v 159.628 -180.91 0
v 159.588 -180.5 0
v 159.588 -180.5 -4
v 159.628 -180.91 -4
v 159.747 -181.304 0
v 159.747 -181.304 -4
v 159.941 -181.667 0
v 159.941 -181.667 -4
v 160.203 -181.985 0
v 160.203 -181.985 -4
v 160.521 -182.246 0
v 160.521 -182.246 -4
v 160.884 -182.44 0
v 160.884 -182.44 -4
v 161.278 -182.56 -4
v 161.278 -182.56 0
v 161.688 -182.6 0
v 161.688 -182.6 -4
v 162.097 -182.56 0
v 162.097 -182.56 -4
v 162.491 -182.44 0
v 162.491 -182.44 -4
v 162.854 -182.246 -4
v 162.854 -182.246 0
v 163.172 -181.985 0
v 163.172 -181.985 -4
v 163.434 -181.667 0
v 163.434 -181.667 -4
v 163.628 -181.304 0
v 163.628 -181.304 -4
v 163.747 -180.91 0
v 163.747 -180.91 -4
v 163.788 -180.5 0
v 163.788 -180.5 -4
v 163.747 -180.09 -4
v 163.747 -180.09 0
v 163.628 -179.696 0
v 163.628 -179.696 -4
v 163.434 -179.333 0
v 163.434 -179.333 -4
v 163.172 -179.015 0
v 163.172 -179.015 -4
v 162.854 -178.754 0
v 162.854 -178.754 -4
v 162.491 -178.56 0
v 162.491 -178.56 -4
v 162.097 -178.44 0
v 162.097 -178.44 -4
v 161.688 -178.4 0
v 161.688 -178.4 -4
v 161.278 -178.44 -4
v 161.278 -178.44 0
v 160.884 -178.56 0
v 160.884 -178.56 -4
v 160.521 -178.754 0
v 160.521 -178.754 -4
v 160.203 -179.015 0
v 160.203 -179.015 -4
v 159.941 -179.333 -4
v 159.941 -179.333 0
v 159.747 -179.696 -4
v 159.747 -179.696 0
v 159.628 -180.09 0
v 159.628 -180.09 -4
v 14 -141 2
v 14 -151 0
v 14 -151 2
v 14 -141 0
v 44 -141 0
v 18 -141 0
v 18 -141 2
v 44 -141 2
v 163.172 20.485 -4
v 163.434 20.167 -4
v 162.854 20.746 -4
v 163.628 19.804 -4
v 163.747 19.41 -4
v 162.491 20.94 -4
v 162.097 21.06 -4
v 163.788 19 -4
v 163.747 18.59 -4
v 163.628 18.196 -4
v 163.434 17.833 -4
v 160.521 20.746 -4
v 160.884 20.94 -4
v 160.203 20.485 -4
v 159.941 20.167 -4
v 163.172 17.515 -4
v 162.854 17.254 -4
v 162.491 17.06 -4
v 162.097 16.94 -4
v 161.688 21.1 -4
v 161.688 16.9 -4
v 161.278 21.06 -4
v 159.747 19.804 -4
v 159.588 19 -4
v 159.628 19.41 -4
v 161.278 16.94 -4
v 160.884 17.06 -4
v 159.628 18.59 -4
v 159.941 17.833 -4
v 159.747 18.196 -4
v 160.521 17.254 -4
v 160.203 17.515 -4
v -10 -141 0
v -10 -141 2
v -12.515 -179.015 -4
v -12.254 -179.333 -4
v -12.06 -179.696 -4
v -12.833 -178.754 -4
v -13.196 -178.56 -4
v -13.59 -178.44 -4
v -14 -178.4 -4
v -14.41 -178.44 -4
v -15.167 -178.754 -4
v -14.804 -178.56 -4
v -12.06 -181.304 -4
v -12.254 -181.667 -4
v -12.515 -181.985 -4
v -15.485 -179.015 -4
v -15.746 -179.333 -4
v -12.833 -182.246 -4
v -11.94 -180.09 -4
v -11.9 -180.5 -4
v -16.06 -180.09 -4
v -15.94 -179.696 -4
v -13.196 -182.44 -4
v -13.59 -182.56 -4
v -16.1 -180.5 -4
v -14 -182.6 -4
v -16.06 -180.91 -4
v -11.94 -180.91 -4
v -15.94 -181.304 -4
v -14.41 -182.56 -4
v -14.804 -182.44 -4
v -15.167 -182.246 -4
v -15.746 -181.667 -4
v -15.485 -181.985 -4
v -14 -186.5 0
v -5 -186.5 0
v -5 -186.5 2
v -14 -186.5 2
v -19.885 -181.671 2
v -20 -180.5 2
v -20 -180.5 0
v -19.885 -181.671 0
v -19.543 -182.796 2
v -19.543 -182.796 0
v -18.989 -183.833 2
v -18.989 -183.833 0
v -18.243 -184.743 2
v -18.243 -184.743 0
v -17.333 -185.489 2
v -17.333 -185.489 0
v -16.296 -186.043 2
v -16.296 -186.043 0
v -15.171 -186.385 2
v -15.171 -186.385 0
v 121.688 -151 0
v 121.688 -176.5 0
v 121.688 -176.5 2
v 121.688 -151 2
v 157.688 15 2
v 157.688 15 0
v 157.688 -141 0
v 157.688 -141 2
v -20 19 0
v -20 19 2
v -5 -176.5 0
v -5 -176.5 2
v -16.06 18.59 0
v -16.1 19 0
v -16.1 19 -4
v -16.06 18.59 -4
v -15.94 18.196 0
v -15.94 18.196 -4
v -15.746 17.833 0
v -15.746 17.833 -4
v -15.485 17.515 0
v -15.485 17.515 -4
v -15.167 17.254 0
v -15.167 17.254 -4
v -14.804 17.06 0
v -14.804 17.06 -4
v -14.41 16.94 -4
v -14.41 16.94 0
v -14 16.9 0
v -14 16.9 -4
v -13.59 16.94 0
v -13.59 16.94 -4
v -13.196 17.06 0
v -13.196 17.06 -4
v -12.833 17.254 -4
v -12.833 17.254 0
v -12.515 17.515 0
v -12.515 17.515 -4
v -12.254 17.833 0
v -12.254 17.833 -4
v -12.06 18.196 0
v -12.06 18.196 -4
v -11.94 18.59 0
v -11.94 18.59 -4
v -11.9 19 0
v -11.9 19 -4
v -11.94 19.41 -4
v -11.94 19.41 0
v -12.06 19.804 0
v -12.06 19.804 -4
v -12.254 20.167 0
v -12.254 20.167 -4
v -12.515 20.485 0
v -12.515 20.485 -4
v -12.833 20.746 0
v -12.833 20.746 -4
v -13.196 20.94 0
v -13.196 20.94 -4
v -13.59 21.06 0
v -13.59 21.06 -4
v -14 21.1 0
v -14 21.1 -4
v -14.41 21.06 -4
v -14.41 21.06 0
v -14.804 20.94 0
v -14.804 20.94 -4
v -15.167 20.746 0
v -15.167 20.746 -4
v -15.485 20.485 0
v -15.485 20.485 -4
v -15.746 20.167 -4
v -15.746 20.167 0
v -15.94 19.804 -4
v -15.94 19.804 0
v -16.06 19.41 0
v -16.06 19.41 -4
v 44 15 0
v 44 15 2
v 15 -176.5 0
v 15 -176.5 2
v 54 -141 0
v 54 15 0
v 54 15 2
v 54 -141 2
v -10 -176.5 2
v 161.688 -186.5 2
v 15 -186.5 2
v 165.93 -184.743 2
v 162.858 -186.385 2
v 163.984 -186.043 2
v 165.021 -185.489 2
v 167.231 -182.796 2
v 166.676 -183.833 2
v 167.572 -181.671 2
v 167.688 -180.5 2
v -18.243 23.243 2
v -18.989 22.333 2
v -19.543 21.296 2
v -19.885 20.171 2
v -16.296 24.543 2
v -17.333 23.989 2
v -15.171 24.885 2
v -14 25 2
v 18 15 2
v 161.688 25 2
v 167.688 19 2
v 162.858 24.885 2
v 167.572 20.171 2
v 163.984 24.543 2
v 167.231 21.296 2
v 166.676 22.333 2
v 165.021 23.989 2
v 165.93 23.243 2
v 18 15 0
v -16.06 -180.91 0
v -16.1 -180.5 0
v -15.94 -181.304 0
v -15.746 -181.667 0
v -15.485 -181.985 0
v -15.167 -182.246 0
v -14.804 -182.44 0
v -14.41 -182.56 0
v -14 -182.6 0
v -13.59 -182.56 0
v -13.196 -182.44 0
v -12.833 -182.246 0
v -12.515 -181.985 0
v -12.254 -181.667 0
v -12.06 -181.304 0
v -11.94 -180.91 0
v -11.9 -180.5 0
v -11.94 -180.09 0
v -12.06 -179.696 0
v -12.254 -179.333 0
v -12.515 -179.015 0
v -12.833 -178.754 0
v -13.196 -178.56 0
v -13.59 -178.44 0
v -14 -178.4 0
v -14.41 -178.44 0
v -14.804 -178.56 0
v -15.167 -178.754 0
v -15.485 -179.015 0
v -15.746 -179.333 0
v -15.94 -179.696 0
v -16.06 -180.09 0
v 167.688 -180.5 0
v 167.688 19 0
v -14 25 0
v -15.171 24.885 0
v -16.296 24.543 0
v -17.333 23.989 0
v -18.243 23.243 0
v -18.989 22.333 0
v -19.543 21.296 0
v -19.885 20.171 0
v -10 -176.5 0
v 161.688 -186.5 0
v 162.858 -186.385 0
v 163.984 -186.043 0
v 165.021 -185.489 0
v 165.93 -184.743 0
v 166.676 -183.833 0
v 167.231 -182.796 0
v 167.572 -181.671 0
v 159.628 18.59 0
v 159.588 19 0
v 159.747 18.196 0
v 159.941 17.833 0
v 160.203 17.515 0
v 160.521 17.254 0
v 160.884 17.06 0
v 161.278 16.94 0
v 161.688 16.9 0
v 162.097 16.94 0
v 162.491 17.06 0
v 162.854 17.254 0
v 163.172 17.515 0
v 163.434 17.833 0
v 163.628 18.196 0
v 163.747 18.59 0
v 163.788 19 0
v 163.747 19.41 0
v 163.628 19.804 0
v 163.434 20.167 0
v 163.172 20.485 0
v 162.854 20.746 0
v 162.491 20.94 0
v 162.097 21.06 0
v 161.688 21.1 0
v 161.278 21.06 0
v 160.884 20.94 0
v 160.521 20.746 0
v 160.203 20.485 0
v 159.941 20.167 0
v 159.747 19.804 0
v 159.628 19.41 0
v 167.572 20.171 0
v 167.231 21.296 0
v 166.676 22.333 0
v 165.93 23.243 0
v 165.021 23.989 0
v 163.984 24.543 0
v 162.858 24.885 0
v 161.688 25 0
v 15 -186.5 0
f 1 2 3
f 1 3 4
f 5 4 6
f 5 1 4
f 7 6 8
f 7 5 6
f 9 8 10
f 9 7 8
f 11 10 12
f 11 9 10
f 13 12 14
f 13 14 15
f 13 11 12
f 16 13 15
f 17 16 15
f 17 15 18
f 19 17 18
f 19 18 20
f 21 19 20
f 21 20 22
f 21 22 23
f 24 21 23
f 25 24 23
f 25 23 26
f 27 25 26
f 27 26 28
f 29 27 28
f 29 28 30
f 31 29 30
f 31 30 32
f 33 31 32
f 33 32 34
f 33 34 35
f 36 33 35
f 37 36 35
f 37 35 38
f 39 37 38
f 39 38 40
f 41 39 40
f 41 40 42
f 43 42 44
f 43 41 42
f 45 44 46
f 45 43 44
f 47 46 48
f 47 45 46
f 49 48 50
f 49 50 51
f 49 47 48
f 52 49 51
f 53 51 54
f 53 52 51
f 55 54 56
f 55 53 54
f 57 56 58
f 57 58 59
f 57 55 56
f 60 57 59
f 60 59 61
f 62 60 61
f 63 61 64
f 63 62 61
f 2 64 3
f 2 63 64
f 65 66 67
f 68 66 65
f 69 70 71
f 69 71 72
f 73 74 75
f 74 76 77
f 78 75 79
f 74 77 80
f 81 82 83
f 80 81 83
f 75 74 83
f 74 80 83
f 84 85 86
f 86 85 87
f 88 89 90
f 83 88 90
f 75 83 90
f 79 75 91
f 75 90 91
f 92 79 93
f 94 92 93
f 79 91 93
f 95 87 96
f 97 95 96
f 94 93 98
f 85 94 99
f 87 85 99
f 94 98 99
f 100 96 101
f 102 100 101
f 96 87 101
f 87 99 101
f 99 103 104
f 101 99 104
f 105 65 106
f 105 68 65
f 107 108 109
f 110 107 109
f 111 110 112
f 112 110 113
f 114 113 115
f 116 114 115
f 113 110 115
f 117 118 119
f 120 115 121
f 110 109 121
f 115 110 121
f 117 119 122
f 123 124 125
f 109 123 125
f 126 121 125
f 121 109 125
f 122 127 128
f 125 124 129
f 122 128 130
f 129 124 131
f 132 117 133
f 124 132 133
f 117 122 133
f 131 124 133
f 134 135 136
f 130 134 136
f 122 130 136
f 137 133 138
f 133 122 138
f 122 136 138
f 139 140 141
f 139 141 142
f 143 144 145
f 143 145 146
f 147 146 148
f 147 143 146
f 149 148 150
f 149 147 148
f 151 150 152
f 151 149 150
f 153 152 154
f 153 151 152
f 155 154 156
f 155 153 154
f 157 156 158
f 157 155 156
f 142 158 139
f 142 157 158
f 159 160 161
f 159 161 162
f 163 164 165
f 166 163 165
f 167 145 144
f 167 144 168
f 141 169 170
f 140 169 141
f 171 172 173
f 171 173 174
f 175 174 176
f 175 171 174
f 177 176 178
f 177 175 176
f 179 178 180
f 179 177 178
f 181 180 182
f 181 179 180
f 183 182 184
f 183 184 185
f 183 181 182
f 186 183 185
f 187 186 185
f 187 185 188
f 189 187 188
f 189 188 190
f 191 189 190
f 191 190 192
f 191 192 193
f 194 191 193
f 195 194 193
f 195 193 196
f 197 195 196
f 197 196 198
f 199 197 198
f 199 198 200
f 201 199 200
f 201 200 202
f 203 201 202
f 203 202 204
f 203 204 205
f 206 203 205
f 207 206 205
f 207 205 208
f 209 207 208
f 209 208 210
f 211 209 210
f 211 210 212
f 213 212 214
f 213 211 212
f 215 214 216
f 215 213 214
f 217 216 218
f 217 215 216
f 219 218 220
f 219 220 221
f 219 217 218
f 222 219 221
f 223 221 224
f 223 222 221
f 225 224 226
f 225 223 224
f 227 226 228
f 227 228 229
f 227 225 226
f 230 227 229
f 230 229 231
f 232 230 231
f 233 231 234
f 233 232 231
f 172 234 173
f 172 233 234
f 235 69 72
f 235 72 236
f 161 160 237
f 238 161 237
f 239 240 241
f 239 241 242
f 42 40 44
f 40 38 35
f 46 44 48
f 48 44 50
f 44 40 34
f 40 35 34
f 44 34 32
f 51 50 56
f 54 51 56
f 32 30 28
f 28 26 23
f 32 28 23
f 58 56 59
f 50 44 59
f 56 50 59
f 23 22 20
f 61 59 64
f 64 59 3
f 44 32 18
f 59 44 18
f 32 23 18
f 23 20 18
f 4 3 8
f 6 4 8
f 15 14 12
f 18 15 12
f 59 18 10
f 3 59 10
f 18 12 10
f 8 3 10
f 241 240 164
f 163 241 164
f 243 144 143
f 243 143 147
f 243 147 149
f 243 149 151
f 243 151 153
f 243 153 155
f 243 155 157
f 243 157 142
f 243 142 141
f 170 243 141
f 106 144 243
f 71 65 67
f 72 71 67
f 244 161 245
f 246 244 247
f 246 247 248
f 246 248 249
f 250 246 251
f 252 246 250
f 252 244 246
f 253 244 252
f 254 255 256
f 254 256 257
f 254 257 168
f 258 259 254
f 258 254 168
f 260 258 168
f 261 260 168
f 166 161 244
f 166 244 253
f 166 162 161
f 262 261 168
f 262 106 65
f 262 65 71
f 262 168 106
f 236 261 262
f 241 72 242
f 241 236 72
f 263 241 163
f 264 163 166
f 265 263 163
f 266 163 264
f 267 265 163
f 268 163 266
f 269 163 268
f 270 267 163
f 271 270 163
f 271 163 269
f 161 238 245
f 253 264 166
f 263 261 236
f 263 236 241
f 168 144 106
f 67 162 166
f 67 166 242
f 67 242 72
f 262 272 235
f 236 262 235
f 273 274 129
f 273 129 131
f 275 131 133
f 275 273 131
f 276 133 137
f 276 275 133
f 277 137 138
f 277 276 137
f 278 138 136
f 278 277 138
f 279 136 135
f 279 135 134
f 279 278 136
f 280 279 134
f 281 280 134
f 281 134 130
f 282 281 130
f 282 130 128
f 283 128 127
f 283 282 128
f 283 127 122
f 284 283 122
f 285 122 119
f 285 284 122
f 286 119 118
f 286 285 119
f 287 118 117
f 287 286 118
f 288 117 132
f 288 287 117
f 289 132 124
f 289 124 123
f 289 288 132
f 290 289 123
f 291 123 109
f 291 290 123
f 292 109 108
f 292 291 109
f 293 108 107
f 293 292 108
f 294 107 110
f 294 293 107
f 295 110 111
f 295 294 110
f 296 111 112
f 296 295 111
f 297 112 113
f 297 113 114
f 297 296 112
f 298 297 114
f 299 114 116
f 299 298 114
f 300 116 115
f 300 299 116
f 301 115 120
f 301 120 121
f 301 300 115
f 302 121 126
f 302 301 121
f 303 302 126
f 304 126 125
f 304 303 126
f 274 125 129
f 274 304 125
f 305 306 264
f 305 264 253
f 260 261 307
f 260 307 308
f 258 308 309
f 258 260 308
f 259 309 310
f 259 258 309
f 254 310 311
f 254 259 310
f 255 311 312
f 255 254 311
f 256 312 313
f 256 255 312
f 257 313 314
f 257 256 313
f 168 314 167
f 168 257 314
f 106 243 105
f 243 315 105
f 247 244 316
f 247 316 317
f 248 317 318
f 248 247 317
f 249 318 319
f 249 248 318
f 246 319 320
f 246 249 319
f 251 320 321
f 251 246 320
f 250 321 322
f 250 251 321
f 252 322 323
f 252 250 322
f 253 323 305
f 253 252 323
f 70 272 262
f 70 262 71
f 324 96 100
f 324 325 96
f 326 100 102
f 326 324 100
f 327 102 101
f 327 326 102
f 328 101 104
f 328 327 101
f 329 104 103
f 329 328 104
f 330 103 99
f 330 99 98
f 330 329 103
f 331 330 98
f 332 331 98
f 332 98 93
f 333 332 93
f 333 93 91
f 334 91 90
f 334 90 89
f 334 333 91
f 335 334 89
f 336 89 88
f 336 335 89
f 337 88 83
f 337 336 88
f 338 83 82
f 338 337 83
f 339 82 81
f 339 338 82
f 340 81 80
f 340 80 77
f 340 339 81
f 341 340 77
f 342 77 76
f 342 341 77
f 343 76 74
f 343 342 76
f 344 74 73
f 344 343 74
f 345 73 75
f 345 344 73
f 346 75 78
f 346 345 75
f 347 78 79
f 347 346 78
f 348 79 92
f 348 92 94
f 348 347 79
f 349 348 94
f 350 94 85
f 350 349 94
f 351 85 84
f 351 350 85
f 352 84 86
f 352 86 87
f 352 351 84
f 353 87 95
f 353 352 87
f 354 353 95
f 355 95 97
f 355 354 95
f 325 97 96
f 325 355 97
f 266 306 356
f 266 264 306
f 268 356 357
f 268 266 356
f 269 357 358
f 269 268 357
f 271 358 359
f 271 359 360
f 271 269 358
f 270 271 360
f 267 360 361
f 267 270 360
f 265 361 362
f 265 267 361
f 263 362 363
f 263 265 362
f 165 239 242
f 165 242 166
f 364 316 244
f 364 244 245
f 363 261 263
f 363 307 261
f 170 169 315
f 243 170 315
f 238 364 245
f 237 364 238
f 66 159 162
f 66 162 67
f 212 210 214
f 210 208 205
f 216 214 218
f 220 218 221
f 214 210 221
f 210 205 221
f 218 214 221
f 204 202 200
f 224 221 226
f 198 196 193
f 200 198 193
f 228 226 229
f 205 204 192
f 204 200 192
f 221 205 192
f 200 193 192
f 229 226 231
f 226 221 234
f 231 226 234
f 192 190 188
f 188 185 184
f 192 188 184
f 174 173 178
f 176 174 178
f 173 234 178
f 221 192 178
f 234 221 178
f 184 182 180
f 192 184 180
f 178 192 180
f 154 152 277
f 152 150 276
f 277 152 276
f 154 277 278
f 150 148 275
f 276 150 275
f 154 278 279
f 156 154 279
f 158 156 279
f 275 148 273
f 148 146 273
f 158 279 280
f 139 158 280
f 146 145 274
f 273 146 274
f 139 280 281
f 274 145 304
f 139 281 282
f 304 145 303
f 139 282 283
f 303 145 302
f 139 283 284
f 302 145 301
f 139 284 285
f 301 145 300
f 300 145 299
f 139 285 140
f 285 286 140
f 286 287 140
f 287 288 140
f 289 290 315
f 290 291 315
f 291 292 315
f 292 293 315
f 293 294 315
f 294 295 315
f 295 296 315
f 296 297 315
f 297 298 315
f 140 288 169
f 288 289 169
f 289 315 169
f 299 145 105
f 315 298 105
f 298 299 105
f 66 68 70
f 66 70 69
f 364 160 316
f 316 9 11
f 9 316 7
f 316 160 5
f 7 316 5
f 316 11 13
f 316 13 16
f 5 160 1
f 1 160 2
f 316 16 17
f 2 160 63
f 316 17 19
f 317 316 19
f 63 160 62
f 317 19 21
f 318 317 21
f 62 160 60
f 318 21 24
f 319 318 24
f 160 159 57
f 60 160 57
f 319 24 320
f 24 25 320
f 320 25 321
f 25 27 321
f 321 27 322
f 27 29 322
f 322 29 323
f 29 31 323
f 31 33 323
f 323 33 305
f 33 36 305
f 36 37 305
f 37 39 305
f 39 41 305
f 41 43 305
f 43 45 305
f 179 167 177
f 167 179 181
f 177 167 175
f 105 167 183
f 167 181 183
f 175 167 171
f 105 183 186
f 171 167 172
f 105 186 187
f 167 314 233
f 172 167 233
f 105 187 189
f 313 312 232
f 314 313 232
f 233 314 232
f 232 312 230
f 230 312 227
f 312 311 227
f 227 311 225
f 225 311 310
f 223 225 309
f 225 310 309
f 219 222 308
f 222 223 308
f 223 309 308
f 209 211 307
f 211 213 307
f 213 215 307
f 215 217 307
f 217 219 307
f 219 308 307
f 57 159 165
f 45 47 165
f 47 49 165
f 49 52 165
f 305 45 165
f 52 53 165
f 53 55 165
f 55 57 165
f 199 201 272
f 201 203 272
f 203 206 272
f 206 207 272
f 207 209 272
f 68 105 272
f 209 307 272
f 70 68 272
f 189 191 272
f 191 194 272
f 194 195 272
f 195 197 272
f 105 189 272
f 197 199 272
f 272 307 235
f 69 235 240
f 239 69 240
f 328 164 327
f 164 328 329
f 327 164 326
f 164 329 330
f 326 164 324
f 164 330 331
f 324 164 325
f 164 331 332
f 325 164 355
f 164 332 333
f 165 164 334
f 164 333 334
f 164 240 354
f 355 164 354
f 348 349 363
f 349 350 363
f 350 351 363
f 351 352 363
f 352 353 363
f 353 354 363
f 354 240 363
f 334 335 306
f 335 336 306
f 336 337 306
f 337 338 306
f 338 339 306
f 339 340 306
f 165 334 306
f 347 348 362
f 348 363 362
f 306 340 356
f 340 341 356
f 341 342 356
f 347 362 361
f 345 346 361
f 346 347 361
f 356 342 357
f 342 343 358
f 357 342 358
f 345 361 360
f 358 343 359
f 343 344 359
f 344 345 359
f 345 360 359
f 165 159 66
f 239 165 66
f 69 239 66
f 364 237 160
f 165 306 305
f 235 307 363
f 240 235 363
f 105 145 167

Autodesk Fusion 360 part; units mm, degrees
sketch "Sketch1" plane through (0, 0, 0) normal (0, 0, 1) x (1, 0, 0)
  line L0 (167.6875, -186.5) -> (-20, -186.5)
  line L1 (-10, 15) -> (157.6875, 15)
  line L2 (-20, -186.5) -> (-20, 25)
  line L3 (167.6875, 25) -> (167.6875, -186.5)
  line L4 (-10, -176.5) -> (-10, 15)
  line L5 (157.6875, 15) -> (157.6875, -176.5)
  line L6 (157.6875, -176.5) -> (-10, -176.5)
  line L7 (-20, 25) -> (167.6875, 25)
  line L8 (15, -176.5) -> (-5, -176.5)
  line L9 (-5, -176.5) -> (-5, -186.5)
  line L10 (-5, -186.5) -> (15, -186.5)
  line L11 (15, -186.5) -> (15, -176.5)
  line L12 (-10, 15) -> (18, 15)
  line L13 (18, 15) -> (18, -141)
  line L14 (18, -141) -> (-10, -141)
  line L15 (-10, -141) -> (-10, 15)
  line L16 (44, 15) -> (54, 15)
  line L17 (54, 15) -> (54, -141)
  line L18 (54, -141) -> (44, -141)
  line L19 (44, -141) -> (44, 15)
  line L20 (157.6875, -176.5) -> (121.6875, -176.5)
  line L21 (121.6875, -176.5) -> (121.6875, -141)
  line L22 (121.6875, -141) -> (157.6875, -141)
  line L23 (157.6875, -141) -> (157.6875, -176.5)
  line L24 (44, -141) -> (121.6875, -141)
  line L25 (121.6875, -141) -> (121.6875, -151)
  line L26 (121.6875, -151) -> (44, -151)
  line L27 (44, -151) -> (44, -141)
  line L28 (44, -151) -> (18, -151)
  line L29 (18, -151) -> (18, -141)
  line L30 (18, -141) -> (44, -141)
  line L31 (44, -141) -> (44, -151)
  line L32 (14, -141) -> (18, -141)
  line L33 (18, -141) -> (18, -151)
  line L34 (18, -151) -> (14, -151)
  line L35 (14, -151) -> (14, -141)
  dimension "d3" = 167.6875
  dimension "d4" = 191.5
  dimension "d5" = 187.6875
  dimension "d6" = 211.5
  dimension "d7" = 10
  dimension "d8" = 10
  dimension "d19" = 20
  dimension "d20" = 15
  dimension "d21" = 28
  dimension "d22" = 156
  dimension "d23" = 10
  dimension "d24" = 156
  dimension "d25" = 26
  dimension "d26" = 36
  dimension "d27" = 35.5
  dimension "d28" = 10
extrude "Extrude1" add sketch "Sketch1" along normal blind 2 contours L0 L1 L2 L3 L4 L5 L6 L7 L9 L11 L12 L15 L16 L20 L23 | L5 L6 L20 L21 L22 L23 L25 | L18 L21 L24 L25 L26 L27 L31 | L1 L4 L12 L13 L14 L15 L32 | L27 L28 L29 L30 L31 L33 | L14 L29 L32 L33 L34 L35 | L1 L16 L17 L18 L19 L24
fillet "Fillet1" radius 6 1 edges at (167.6875, -186.5, 1)
fillet "Fillet2" radius 6 1 edges at (167.6875, 25, 1)
fillet "Fillet3" radius 6 1 edges at (-20, 25, 1)
fillet "Fillet4" radius 6 1 edges at (-20, -186.5, 1)
sketch "Sketch2" plane through (0, 0, 2) normal (0, 0, 1) x (-1, 0, 0)
  arc A0 (20, 180.5) -> (14, 186.5) centre (14, 180.5) ccw
  line L0 (14, 186.5) -> (5, 186.5)
  line L1 (5, 186.5) -> (5, 176.5)
  line L2 (5, 176.5) -> (10, 176.5)
  line L3 (10, 176.5) -> (10, 141)
  line L4 (10, 141) -> (-14, 141)
  line L5 (-14, 141) -> (-14, 151)
  line L6 (-14, 151) -> (-121.6875, 151)
  line L7 (-121.6875, 151) -> (-121.6875, 176.5)
  line L8 (-121.6875, 176.5) -> (-15, 176.5)
  line L9 (-15, 176.5) -> (-15, 186.5)
  line L10 (-15, 186.5) -> (-161.6875, 186.5)
  arc A1 (-161.6875, 186.5) -> (-167.6875, 180.5) centre (-161.6875, 180.5) ccw
  line L11 (-167.6875, 180.5) -> (-167.6875, -19)
  arc A2 (-167.6875, -19) -> (-161.6875, -25) centre (-161.6875, -19) ccw
  line L12 (-161.6875, -25) -> (14, -25)
  arc A3 (14, -25) -> (20, -19) centre (14, -19) ccw
  line L13 (20, -19) -> (20, 180.5)
  line L14 (-18, 141) -> (-18, -15)
  line L15 (-18, -15) -> (-44, -15)
  line L16 (-44, -15) -> (-44, 141)
  line L17 (-44, 141) -> (-18, 141)
  line L18 (-54, -15) -> (-157.6875, -15)
  line L19 (-157.6875, -15) -> (-157.6875, 141)
  line L20 (-157.6875, 141) -> (-54, 141)
  line L21 (-54, 141) -> (-54, -15)
  circle A4 centre (14, -19) radius 2.1
  circle A5 centre (-161.6875, -19) radius 2.1
  circle A6 centre (-161.6875, 180.5) radius 2.1
  circle A7 centre (14, 180.5) radius 2.1
  dimension "d29" = 4.2
  dimension "d30" = 4.2
  dimension "d31" = 4.2
  dimension "d32" = 4.2
  dimension "d33" = 6
  dimension "d34" = 6
  dimension "d35" = 6
  dimension "d36" = 6
  dimension "d37" = 6
  dimension "d38" = 6
  dimension "d39" = 6
  dimension "d40" = 6
extrude "Extrude2" add sketch "Sketch2" against normal blind 6 contours A4 | A5 | A6 | A7
